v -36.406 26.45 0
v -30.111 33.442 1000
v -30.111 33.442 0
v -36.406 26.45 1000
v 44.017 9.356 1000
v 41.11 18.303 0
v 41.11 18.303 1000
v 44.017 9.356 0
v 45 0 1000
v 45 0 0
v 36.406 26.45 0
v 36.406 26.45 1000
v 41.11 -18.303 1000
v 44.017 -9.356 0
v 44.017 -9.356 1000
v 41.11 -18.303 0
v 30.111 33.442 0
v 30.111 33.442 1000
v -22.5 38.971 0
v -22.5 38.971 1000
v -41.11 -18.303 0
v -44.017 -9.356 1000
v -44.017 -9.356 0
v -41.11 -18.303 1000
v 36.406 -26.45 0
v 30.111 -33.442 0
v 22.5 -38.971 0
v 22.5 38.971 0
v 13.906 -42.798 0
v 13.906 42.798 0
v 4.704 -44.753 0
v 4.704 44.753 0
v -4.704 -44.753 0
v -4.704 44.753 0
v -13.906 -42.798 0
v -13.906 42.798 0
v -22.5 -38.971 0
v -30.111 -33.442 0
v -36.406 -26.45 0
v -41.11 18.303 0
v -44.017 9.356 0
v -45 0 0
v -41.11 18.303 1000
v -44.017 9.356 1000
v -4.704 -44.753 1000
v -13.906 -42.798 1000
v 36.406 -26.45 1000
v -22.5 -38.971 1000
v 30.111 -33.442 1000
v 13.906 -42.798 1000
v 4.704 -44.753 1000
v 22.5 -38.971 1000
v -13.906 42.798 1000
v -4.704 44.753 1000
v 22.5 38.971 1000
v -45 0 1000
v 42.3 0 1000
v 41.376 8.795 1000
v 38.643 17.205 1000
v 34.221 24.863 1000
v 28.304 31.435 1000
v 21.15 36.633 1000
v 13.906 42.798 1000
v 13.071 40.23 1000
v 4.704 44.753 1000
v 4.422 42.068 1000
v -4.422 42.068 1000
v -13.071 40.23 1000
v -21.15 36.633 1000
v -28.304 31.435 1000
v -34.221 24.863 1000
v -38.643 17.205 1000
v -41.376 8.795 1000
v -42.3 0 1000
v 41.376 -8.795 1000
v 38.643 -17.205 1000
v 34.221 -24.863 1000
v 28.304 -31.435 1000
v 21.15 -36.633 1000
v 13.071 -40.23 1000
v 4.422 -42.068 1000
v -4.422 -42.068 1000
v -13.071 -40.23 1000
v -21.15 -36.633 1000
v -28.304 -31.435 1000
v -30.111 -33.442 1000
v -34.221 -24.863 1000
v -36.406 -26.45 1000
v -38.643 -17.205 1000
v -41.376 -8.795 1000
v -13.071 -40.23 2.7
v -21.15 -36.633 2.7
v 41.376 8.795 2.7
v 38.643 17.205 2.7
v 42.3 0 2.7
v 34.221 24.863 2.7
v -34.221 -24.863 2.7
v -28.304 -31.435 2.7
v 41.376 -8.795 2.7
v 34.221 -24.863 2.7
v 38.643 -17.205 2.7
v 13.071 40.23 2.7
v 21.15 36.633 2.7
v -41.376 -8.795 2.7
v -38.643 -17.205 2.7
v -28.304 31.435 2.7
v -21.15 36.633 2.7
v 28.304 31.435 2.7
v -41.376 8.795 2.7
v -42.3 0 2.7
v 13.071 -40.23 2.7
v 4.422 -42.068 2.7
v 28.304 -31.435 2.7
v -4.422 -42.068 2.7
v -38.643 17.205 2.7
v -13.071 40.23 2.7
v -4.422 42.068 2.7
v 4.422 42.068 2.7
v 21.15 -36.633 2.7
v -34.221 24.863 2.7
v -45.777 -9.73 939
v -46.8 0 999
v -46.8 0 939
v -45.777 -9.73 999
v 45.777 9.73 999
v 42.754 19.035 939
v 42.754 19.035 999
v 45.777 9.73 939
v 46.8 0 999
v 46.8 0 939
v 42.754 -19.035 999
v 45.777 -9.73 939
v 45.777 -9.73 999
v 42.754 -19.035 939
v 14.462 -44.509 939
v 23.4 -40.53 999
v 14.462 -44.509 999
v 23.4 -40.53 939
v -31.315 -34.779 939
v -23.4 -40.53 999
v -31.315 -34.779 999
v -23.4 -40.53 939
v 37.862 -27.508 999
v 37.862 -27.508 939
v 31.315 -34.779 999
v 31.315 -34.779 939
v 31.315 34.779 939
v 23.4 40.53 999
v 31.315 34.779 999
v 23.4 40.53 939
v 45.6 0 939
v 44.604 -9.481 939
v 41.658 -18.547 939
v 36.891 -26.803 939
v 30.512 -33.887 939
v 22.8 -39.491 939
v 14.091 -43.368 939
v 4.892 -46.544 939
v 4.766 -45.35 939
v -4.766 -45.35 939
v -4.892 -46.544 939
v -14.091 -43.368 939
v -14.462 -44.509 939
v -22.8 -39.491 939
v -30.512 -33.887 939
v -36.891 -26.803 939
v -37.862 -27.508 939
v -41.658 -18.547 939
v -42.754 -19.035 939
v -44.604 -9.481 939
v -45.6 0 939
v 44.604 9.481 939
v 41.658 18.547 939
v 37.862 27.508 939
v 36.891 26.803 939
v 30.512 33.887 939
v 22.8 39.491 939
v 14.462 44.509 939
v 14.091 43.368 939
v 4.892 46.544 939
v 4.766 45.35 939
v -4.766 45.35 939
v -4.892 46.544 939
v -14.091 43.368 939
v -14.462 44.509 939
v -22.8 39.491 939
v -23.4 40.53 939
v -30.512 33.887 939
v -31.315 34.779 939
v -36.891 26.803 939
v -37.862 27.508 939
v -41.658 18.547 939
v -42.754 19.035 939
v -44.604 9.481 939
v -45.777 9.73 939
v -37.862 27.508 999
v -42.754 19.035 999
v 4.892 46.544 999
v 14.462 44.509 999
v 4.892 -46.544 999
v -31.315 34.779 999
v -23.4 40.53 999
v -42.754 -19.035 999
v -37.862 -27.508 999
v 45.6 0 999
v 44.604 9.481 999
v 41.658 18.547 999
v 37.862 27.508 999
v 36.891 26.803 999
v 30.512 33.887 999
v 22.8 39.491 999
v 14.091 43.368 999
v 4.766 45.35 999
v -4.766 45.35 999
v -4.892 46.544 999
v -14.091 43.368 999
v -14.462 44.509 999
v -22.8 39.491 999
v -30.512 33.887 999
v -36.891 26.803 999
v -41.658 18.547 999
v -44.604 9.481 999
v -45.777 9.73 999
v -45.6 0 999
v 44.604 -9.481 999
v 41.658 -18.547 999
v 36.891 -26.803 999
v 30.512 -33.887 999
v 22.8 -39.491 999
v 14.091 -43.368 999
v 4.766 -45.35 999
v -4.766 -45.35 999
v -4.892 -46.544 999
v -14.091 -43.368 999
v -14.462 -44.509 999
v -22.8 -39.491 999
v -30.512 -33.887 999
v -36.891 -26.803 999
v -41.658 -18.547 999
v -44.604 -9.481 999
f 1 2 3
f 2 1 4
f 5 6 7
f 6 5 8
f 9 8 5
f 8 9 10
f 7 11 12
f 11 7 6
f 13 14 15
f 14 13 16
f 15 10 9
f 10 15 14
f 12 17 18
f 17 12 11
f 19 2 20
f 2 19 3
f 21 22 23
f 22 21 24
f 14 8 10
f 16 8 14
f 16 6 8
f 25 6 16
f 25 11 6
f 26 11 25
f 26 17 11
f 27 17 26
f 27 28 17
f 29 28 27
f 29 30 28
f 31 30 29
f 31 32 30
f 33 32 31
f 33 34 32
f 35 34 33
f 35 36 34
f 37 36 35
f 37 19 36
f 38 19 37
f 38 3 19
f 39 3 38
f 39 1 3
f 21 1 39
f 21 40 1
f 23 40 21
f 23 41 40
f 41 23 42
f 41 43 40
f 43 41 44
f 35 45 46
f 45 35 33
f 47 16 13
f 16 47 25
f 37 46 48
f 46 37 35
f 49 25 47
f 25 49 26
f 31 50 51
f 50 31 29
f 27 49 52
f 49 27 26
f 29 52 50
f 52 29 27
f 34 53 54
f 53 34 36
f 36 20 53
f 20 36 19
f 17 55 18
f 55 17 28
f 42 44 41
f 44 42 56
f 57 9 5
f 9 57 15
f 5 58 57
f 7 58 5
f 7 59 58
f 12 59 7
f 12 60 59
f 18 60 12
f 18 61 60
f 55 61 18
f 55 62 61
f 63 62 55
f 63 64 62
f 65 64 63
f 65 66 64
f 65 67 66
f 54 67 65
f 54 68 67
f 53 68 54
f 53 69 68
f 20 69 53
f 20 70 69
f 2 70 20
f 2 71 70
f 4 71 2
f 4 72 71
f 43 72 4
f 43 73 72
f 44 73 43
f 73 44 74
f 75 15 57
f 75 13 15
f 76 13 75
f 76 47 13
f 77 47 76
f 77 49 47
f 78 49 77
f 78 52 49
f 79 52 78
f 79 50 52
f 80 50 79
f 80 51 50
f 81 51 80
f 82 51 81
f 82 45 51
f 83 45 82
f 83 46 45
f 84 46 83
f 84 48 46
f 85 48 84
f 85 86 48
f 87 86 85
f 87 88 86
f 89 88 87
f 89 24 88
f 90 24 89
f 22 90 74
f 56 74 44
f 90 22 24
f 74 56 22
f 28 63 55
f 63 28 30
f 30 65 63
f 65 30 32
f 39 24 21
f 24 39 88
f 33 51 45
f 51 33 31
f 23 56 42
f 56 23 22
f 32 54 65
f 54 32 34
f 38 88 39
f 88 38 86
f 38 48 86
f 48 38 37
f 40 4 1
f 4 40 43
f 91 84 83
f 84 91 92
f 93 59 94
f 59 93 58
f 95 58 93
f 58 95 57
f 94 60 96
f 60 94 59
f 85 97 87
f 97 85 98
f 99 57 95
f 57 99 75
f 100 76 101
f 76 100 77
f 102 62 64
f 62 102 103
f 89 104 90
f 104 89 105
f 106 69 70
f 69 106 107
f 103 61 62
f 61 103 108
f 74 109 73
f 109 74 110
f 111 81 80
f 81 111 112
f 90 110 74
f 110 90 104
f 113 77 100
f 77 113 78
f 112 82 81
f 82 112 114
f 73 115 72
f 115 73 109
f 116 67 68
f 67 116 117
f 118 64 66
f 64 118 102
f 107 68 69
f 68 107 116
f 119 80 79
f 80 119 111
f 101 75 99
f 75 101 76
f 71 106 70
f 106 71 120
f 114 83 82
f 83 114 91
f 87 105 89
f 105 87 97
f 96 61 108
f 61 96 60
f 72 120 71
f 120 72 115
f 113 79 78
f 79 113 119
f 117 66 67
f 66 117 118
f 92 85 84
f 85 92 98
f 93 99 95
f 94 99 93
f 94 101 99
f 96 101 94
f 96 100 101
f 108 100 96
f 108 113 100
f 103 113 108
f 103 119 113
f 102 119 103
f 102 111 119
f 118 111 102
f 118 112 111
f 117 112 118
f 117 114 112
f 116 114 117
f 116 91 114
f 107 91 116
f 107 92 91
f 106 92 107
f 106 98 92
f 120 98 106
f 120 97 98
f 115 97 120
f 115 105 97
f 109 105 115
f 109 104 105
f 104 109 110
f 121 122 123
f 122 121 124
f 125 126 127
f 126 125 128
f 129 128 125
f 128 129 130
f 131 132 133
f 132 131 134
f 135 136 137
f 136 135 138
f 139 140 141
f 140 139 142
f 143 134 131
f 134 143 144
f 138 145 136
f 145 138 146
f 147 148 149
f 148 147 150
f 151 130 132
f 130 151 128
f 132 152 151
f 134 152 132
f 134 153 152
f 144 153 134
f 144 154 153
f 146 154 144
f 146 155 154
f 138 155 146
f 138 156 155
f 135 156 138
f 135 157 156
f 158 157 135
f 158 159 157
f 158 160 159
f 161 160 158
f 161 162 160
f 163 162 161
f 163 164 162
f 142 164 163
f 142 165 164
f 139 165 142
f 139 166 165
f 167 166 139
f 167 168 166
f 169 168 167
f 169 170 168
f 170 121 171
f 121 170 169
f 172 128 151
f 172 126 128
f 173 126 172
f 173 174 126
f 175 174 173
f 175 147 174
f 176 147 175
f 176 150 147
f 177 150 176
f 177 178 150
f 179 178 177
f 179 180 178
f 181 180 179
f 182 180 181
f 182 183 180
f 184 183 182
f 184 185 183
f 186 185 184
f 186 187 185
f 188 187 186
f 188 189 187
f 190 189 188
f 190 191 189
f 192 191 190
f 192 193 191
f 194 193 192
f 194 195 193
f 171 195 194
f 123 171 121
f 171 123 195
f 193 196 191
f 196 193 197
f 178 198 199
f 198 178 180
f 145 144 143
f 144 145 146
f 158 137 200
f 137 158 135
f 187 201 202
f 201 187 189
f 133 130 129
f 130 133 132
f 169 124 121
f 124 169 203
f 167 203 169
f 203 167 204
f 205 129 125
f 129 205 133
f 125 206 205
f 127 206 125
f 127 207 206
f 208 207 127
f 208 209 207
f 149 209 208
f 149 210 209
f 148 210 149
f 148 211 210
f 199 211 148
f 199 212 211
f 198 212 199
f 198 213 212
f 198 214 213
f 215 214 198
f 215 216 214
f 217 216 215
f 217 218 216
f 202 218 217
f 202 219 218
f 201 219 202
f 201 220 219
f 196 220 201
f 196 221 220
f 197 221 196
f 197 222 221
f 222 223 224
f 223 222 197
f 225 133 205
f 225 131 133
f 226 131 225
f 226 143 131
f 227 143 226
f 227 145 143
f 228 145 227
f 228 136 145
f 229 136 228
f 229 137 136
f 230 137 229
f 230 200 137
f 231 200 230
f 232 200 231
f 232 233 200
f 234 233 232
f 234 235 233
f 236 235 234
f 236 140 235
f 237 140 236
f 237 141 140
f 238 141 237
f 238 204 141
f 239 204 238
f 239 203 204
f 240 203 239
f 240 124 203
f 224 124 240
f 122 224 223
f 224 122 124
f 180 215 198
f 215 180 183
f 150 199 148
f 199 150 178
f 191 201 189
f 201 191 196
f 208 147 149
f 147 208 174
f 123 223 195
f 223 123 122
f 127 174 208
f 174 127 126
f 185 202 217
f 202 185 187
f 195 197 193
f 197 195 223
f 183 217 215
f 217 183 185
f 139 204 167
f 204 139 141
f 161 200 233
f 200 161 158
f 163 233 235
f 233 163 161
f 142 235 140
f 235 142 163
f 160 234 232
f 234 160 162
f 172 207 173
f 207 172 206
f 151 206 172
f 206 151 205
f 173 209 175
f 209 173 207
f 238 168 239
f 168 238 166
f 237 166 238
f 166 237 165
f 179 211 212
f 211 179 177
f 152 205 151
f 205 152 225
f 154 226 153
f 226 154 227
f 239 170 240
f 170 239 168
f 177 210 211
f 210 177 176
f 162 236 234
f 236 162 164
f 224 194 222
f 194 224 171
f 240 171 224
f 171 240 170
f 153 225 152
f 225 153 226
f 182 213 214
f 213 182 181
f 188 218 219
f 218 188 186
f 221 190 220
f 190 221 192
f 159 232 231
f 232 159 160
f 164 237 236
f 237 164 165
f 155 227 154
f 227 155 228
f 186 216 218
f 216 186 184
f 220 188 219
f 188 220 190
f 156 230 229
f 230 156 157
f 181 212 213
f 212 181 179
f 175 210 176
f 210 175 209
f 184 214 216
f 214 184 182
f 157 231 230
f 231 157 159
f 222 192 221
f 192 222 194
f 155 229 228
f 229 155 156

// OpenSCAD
// Parameters
length_mm = 1000; //[500:2000:10]
outer_diameter_mm = 90; //[45:180:1]
wall_thickness_mm = 2.7; //[1.3:5.4:0.1]
include_end_fitting = 1; //[0:1:1]
end_fitting_count = 1; //[0:1:1]
socket_length_mm = 60; //[30:120:1]
socket_wall_extra_mm = 1.8; //[0.5:4:0.1]
socket_stop_thickness_mm = 4; //[2:10:0.5]
socket_clearance_mm = 0.6; //[0.2:1.5:0.1]
connection_overlap_mm = 1; //[0.5:2:0.1]

// HT Pipe - complete geometry
module ht_pipe() {
  color([0.85, 0.85, 0.8]) {
    // Pipe body
    difference() {
      cylinder(h=length_mm, r=outer_diameter_mm/2, center=false);
      translate([0, 0, wall_thickness_mm])
        cylinder(h=length_mm, r=outer_diameter_mm/2 - wall_thickness_mm, center=false);
    }
    
    // End fitting socket
    if (include_end_fitting && end_fitting_count > 0) {
      translate([0, 0, length_mm - socket_length_mm - connection_overlap_mm]) {
        difference() {
          cylinder(h=socket_length_mm, r=outer_diameter_mm/2 + socket_wall_extra_mm, center=false);
          translate([0, 0, 0])
            cylinder(h=socket_length_mm, r=outer_diameter_mm/2 + socket_clearance_mm, center=false);
          translate([0, 0, socket_length_mm - socket_stop_thickness_mm])
            cylinder(h=socket_stop_thickness_mm, r=outer_diameter_mm/2 + socket_clearance_mm, center=false);
        }
      }
    }
  }
}

// Assembly
module assembly() {
  ht_pipe();
}

assembly();
